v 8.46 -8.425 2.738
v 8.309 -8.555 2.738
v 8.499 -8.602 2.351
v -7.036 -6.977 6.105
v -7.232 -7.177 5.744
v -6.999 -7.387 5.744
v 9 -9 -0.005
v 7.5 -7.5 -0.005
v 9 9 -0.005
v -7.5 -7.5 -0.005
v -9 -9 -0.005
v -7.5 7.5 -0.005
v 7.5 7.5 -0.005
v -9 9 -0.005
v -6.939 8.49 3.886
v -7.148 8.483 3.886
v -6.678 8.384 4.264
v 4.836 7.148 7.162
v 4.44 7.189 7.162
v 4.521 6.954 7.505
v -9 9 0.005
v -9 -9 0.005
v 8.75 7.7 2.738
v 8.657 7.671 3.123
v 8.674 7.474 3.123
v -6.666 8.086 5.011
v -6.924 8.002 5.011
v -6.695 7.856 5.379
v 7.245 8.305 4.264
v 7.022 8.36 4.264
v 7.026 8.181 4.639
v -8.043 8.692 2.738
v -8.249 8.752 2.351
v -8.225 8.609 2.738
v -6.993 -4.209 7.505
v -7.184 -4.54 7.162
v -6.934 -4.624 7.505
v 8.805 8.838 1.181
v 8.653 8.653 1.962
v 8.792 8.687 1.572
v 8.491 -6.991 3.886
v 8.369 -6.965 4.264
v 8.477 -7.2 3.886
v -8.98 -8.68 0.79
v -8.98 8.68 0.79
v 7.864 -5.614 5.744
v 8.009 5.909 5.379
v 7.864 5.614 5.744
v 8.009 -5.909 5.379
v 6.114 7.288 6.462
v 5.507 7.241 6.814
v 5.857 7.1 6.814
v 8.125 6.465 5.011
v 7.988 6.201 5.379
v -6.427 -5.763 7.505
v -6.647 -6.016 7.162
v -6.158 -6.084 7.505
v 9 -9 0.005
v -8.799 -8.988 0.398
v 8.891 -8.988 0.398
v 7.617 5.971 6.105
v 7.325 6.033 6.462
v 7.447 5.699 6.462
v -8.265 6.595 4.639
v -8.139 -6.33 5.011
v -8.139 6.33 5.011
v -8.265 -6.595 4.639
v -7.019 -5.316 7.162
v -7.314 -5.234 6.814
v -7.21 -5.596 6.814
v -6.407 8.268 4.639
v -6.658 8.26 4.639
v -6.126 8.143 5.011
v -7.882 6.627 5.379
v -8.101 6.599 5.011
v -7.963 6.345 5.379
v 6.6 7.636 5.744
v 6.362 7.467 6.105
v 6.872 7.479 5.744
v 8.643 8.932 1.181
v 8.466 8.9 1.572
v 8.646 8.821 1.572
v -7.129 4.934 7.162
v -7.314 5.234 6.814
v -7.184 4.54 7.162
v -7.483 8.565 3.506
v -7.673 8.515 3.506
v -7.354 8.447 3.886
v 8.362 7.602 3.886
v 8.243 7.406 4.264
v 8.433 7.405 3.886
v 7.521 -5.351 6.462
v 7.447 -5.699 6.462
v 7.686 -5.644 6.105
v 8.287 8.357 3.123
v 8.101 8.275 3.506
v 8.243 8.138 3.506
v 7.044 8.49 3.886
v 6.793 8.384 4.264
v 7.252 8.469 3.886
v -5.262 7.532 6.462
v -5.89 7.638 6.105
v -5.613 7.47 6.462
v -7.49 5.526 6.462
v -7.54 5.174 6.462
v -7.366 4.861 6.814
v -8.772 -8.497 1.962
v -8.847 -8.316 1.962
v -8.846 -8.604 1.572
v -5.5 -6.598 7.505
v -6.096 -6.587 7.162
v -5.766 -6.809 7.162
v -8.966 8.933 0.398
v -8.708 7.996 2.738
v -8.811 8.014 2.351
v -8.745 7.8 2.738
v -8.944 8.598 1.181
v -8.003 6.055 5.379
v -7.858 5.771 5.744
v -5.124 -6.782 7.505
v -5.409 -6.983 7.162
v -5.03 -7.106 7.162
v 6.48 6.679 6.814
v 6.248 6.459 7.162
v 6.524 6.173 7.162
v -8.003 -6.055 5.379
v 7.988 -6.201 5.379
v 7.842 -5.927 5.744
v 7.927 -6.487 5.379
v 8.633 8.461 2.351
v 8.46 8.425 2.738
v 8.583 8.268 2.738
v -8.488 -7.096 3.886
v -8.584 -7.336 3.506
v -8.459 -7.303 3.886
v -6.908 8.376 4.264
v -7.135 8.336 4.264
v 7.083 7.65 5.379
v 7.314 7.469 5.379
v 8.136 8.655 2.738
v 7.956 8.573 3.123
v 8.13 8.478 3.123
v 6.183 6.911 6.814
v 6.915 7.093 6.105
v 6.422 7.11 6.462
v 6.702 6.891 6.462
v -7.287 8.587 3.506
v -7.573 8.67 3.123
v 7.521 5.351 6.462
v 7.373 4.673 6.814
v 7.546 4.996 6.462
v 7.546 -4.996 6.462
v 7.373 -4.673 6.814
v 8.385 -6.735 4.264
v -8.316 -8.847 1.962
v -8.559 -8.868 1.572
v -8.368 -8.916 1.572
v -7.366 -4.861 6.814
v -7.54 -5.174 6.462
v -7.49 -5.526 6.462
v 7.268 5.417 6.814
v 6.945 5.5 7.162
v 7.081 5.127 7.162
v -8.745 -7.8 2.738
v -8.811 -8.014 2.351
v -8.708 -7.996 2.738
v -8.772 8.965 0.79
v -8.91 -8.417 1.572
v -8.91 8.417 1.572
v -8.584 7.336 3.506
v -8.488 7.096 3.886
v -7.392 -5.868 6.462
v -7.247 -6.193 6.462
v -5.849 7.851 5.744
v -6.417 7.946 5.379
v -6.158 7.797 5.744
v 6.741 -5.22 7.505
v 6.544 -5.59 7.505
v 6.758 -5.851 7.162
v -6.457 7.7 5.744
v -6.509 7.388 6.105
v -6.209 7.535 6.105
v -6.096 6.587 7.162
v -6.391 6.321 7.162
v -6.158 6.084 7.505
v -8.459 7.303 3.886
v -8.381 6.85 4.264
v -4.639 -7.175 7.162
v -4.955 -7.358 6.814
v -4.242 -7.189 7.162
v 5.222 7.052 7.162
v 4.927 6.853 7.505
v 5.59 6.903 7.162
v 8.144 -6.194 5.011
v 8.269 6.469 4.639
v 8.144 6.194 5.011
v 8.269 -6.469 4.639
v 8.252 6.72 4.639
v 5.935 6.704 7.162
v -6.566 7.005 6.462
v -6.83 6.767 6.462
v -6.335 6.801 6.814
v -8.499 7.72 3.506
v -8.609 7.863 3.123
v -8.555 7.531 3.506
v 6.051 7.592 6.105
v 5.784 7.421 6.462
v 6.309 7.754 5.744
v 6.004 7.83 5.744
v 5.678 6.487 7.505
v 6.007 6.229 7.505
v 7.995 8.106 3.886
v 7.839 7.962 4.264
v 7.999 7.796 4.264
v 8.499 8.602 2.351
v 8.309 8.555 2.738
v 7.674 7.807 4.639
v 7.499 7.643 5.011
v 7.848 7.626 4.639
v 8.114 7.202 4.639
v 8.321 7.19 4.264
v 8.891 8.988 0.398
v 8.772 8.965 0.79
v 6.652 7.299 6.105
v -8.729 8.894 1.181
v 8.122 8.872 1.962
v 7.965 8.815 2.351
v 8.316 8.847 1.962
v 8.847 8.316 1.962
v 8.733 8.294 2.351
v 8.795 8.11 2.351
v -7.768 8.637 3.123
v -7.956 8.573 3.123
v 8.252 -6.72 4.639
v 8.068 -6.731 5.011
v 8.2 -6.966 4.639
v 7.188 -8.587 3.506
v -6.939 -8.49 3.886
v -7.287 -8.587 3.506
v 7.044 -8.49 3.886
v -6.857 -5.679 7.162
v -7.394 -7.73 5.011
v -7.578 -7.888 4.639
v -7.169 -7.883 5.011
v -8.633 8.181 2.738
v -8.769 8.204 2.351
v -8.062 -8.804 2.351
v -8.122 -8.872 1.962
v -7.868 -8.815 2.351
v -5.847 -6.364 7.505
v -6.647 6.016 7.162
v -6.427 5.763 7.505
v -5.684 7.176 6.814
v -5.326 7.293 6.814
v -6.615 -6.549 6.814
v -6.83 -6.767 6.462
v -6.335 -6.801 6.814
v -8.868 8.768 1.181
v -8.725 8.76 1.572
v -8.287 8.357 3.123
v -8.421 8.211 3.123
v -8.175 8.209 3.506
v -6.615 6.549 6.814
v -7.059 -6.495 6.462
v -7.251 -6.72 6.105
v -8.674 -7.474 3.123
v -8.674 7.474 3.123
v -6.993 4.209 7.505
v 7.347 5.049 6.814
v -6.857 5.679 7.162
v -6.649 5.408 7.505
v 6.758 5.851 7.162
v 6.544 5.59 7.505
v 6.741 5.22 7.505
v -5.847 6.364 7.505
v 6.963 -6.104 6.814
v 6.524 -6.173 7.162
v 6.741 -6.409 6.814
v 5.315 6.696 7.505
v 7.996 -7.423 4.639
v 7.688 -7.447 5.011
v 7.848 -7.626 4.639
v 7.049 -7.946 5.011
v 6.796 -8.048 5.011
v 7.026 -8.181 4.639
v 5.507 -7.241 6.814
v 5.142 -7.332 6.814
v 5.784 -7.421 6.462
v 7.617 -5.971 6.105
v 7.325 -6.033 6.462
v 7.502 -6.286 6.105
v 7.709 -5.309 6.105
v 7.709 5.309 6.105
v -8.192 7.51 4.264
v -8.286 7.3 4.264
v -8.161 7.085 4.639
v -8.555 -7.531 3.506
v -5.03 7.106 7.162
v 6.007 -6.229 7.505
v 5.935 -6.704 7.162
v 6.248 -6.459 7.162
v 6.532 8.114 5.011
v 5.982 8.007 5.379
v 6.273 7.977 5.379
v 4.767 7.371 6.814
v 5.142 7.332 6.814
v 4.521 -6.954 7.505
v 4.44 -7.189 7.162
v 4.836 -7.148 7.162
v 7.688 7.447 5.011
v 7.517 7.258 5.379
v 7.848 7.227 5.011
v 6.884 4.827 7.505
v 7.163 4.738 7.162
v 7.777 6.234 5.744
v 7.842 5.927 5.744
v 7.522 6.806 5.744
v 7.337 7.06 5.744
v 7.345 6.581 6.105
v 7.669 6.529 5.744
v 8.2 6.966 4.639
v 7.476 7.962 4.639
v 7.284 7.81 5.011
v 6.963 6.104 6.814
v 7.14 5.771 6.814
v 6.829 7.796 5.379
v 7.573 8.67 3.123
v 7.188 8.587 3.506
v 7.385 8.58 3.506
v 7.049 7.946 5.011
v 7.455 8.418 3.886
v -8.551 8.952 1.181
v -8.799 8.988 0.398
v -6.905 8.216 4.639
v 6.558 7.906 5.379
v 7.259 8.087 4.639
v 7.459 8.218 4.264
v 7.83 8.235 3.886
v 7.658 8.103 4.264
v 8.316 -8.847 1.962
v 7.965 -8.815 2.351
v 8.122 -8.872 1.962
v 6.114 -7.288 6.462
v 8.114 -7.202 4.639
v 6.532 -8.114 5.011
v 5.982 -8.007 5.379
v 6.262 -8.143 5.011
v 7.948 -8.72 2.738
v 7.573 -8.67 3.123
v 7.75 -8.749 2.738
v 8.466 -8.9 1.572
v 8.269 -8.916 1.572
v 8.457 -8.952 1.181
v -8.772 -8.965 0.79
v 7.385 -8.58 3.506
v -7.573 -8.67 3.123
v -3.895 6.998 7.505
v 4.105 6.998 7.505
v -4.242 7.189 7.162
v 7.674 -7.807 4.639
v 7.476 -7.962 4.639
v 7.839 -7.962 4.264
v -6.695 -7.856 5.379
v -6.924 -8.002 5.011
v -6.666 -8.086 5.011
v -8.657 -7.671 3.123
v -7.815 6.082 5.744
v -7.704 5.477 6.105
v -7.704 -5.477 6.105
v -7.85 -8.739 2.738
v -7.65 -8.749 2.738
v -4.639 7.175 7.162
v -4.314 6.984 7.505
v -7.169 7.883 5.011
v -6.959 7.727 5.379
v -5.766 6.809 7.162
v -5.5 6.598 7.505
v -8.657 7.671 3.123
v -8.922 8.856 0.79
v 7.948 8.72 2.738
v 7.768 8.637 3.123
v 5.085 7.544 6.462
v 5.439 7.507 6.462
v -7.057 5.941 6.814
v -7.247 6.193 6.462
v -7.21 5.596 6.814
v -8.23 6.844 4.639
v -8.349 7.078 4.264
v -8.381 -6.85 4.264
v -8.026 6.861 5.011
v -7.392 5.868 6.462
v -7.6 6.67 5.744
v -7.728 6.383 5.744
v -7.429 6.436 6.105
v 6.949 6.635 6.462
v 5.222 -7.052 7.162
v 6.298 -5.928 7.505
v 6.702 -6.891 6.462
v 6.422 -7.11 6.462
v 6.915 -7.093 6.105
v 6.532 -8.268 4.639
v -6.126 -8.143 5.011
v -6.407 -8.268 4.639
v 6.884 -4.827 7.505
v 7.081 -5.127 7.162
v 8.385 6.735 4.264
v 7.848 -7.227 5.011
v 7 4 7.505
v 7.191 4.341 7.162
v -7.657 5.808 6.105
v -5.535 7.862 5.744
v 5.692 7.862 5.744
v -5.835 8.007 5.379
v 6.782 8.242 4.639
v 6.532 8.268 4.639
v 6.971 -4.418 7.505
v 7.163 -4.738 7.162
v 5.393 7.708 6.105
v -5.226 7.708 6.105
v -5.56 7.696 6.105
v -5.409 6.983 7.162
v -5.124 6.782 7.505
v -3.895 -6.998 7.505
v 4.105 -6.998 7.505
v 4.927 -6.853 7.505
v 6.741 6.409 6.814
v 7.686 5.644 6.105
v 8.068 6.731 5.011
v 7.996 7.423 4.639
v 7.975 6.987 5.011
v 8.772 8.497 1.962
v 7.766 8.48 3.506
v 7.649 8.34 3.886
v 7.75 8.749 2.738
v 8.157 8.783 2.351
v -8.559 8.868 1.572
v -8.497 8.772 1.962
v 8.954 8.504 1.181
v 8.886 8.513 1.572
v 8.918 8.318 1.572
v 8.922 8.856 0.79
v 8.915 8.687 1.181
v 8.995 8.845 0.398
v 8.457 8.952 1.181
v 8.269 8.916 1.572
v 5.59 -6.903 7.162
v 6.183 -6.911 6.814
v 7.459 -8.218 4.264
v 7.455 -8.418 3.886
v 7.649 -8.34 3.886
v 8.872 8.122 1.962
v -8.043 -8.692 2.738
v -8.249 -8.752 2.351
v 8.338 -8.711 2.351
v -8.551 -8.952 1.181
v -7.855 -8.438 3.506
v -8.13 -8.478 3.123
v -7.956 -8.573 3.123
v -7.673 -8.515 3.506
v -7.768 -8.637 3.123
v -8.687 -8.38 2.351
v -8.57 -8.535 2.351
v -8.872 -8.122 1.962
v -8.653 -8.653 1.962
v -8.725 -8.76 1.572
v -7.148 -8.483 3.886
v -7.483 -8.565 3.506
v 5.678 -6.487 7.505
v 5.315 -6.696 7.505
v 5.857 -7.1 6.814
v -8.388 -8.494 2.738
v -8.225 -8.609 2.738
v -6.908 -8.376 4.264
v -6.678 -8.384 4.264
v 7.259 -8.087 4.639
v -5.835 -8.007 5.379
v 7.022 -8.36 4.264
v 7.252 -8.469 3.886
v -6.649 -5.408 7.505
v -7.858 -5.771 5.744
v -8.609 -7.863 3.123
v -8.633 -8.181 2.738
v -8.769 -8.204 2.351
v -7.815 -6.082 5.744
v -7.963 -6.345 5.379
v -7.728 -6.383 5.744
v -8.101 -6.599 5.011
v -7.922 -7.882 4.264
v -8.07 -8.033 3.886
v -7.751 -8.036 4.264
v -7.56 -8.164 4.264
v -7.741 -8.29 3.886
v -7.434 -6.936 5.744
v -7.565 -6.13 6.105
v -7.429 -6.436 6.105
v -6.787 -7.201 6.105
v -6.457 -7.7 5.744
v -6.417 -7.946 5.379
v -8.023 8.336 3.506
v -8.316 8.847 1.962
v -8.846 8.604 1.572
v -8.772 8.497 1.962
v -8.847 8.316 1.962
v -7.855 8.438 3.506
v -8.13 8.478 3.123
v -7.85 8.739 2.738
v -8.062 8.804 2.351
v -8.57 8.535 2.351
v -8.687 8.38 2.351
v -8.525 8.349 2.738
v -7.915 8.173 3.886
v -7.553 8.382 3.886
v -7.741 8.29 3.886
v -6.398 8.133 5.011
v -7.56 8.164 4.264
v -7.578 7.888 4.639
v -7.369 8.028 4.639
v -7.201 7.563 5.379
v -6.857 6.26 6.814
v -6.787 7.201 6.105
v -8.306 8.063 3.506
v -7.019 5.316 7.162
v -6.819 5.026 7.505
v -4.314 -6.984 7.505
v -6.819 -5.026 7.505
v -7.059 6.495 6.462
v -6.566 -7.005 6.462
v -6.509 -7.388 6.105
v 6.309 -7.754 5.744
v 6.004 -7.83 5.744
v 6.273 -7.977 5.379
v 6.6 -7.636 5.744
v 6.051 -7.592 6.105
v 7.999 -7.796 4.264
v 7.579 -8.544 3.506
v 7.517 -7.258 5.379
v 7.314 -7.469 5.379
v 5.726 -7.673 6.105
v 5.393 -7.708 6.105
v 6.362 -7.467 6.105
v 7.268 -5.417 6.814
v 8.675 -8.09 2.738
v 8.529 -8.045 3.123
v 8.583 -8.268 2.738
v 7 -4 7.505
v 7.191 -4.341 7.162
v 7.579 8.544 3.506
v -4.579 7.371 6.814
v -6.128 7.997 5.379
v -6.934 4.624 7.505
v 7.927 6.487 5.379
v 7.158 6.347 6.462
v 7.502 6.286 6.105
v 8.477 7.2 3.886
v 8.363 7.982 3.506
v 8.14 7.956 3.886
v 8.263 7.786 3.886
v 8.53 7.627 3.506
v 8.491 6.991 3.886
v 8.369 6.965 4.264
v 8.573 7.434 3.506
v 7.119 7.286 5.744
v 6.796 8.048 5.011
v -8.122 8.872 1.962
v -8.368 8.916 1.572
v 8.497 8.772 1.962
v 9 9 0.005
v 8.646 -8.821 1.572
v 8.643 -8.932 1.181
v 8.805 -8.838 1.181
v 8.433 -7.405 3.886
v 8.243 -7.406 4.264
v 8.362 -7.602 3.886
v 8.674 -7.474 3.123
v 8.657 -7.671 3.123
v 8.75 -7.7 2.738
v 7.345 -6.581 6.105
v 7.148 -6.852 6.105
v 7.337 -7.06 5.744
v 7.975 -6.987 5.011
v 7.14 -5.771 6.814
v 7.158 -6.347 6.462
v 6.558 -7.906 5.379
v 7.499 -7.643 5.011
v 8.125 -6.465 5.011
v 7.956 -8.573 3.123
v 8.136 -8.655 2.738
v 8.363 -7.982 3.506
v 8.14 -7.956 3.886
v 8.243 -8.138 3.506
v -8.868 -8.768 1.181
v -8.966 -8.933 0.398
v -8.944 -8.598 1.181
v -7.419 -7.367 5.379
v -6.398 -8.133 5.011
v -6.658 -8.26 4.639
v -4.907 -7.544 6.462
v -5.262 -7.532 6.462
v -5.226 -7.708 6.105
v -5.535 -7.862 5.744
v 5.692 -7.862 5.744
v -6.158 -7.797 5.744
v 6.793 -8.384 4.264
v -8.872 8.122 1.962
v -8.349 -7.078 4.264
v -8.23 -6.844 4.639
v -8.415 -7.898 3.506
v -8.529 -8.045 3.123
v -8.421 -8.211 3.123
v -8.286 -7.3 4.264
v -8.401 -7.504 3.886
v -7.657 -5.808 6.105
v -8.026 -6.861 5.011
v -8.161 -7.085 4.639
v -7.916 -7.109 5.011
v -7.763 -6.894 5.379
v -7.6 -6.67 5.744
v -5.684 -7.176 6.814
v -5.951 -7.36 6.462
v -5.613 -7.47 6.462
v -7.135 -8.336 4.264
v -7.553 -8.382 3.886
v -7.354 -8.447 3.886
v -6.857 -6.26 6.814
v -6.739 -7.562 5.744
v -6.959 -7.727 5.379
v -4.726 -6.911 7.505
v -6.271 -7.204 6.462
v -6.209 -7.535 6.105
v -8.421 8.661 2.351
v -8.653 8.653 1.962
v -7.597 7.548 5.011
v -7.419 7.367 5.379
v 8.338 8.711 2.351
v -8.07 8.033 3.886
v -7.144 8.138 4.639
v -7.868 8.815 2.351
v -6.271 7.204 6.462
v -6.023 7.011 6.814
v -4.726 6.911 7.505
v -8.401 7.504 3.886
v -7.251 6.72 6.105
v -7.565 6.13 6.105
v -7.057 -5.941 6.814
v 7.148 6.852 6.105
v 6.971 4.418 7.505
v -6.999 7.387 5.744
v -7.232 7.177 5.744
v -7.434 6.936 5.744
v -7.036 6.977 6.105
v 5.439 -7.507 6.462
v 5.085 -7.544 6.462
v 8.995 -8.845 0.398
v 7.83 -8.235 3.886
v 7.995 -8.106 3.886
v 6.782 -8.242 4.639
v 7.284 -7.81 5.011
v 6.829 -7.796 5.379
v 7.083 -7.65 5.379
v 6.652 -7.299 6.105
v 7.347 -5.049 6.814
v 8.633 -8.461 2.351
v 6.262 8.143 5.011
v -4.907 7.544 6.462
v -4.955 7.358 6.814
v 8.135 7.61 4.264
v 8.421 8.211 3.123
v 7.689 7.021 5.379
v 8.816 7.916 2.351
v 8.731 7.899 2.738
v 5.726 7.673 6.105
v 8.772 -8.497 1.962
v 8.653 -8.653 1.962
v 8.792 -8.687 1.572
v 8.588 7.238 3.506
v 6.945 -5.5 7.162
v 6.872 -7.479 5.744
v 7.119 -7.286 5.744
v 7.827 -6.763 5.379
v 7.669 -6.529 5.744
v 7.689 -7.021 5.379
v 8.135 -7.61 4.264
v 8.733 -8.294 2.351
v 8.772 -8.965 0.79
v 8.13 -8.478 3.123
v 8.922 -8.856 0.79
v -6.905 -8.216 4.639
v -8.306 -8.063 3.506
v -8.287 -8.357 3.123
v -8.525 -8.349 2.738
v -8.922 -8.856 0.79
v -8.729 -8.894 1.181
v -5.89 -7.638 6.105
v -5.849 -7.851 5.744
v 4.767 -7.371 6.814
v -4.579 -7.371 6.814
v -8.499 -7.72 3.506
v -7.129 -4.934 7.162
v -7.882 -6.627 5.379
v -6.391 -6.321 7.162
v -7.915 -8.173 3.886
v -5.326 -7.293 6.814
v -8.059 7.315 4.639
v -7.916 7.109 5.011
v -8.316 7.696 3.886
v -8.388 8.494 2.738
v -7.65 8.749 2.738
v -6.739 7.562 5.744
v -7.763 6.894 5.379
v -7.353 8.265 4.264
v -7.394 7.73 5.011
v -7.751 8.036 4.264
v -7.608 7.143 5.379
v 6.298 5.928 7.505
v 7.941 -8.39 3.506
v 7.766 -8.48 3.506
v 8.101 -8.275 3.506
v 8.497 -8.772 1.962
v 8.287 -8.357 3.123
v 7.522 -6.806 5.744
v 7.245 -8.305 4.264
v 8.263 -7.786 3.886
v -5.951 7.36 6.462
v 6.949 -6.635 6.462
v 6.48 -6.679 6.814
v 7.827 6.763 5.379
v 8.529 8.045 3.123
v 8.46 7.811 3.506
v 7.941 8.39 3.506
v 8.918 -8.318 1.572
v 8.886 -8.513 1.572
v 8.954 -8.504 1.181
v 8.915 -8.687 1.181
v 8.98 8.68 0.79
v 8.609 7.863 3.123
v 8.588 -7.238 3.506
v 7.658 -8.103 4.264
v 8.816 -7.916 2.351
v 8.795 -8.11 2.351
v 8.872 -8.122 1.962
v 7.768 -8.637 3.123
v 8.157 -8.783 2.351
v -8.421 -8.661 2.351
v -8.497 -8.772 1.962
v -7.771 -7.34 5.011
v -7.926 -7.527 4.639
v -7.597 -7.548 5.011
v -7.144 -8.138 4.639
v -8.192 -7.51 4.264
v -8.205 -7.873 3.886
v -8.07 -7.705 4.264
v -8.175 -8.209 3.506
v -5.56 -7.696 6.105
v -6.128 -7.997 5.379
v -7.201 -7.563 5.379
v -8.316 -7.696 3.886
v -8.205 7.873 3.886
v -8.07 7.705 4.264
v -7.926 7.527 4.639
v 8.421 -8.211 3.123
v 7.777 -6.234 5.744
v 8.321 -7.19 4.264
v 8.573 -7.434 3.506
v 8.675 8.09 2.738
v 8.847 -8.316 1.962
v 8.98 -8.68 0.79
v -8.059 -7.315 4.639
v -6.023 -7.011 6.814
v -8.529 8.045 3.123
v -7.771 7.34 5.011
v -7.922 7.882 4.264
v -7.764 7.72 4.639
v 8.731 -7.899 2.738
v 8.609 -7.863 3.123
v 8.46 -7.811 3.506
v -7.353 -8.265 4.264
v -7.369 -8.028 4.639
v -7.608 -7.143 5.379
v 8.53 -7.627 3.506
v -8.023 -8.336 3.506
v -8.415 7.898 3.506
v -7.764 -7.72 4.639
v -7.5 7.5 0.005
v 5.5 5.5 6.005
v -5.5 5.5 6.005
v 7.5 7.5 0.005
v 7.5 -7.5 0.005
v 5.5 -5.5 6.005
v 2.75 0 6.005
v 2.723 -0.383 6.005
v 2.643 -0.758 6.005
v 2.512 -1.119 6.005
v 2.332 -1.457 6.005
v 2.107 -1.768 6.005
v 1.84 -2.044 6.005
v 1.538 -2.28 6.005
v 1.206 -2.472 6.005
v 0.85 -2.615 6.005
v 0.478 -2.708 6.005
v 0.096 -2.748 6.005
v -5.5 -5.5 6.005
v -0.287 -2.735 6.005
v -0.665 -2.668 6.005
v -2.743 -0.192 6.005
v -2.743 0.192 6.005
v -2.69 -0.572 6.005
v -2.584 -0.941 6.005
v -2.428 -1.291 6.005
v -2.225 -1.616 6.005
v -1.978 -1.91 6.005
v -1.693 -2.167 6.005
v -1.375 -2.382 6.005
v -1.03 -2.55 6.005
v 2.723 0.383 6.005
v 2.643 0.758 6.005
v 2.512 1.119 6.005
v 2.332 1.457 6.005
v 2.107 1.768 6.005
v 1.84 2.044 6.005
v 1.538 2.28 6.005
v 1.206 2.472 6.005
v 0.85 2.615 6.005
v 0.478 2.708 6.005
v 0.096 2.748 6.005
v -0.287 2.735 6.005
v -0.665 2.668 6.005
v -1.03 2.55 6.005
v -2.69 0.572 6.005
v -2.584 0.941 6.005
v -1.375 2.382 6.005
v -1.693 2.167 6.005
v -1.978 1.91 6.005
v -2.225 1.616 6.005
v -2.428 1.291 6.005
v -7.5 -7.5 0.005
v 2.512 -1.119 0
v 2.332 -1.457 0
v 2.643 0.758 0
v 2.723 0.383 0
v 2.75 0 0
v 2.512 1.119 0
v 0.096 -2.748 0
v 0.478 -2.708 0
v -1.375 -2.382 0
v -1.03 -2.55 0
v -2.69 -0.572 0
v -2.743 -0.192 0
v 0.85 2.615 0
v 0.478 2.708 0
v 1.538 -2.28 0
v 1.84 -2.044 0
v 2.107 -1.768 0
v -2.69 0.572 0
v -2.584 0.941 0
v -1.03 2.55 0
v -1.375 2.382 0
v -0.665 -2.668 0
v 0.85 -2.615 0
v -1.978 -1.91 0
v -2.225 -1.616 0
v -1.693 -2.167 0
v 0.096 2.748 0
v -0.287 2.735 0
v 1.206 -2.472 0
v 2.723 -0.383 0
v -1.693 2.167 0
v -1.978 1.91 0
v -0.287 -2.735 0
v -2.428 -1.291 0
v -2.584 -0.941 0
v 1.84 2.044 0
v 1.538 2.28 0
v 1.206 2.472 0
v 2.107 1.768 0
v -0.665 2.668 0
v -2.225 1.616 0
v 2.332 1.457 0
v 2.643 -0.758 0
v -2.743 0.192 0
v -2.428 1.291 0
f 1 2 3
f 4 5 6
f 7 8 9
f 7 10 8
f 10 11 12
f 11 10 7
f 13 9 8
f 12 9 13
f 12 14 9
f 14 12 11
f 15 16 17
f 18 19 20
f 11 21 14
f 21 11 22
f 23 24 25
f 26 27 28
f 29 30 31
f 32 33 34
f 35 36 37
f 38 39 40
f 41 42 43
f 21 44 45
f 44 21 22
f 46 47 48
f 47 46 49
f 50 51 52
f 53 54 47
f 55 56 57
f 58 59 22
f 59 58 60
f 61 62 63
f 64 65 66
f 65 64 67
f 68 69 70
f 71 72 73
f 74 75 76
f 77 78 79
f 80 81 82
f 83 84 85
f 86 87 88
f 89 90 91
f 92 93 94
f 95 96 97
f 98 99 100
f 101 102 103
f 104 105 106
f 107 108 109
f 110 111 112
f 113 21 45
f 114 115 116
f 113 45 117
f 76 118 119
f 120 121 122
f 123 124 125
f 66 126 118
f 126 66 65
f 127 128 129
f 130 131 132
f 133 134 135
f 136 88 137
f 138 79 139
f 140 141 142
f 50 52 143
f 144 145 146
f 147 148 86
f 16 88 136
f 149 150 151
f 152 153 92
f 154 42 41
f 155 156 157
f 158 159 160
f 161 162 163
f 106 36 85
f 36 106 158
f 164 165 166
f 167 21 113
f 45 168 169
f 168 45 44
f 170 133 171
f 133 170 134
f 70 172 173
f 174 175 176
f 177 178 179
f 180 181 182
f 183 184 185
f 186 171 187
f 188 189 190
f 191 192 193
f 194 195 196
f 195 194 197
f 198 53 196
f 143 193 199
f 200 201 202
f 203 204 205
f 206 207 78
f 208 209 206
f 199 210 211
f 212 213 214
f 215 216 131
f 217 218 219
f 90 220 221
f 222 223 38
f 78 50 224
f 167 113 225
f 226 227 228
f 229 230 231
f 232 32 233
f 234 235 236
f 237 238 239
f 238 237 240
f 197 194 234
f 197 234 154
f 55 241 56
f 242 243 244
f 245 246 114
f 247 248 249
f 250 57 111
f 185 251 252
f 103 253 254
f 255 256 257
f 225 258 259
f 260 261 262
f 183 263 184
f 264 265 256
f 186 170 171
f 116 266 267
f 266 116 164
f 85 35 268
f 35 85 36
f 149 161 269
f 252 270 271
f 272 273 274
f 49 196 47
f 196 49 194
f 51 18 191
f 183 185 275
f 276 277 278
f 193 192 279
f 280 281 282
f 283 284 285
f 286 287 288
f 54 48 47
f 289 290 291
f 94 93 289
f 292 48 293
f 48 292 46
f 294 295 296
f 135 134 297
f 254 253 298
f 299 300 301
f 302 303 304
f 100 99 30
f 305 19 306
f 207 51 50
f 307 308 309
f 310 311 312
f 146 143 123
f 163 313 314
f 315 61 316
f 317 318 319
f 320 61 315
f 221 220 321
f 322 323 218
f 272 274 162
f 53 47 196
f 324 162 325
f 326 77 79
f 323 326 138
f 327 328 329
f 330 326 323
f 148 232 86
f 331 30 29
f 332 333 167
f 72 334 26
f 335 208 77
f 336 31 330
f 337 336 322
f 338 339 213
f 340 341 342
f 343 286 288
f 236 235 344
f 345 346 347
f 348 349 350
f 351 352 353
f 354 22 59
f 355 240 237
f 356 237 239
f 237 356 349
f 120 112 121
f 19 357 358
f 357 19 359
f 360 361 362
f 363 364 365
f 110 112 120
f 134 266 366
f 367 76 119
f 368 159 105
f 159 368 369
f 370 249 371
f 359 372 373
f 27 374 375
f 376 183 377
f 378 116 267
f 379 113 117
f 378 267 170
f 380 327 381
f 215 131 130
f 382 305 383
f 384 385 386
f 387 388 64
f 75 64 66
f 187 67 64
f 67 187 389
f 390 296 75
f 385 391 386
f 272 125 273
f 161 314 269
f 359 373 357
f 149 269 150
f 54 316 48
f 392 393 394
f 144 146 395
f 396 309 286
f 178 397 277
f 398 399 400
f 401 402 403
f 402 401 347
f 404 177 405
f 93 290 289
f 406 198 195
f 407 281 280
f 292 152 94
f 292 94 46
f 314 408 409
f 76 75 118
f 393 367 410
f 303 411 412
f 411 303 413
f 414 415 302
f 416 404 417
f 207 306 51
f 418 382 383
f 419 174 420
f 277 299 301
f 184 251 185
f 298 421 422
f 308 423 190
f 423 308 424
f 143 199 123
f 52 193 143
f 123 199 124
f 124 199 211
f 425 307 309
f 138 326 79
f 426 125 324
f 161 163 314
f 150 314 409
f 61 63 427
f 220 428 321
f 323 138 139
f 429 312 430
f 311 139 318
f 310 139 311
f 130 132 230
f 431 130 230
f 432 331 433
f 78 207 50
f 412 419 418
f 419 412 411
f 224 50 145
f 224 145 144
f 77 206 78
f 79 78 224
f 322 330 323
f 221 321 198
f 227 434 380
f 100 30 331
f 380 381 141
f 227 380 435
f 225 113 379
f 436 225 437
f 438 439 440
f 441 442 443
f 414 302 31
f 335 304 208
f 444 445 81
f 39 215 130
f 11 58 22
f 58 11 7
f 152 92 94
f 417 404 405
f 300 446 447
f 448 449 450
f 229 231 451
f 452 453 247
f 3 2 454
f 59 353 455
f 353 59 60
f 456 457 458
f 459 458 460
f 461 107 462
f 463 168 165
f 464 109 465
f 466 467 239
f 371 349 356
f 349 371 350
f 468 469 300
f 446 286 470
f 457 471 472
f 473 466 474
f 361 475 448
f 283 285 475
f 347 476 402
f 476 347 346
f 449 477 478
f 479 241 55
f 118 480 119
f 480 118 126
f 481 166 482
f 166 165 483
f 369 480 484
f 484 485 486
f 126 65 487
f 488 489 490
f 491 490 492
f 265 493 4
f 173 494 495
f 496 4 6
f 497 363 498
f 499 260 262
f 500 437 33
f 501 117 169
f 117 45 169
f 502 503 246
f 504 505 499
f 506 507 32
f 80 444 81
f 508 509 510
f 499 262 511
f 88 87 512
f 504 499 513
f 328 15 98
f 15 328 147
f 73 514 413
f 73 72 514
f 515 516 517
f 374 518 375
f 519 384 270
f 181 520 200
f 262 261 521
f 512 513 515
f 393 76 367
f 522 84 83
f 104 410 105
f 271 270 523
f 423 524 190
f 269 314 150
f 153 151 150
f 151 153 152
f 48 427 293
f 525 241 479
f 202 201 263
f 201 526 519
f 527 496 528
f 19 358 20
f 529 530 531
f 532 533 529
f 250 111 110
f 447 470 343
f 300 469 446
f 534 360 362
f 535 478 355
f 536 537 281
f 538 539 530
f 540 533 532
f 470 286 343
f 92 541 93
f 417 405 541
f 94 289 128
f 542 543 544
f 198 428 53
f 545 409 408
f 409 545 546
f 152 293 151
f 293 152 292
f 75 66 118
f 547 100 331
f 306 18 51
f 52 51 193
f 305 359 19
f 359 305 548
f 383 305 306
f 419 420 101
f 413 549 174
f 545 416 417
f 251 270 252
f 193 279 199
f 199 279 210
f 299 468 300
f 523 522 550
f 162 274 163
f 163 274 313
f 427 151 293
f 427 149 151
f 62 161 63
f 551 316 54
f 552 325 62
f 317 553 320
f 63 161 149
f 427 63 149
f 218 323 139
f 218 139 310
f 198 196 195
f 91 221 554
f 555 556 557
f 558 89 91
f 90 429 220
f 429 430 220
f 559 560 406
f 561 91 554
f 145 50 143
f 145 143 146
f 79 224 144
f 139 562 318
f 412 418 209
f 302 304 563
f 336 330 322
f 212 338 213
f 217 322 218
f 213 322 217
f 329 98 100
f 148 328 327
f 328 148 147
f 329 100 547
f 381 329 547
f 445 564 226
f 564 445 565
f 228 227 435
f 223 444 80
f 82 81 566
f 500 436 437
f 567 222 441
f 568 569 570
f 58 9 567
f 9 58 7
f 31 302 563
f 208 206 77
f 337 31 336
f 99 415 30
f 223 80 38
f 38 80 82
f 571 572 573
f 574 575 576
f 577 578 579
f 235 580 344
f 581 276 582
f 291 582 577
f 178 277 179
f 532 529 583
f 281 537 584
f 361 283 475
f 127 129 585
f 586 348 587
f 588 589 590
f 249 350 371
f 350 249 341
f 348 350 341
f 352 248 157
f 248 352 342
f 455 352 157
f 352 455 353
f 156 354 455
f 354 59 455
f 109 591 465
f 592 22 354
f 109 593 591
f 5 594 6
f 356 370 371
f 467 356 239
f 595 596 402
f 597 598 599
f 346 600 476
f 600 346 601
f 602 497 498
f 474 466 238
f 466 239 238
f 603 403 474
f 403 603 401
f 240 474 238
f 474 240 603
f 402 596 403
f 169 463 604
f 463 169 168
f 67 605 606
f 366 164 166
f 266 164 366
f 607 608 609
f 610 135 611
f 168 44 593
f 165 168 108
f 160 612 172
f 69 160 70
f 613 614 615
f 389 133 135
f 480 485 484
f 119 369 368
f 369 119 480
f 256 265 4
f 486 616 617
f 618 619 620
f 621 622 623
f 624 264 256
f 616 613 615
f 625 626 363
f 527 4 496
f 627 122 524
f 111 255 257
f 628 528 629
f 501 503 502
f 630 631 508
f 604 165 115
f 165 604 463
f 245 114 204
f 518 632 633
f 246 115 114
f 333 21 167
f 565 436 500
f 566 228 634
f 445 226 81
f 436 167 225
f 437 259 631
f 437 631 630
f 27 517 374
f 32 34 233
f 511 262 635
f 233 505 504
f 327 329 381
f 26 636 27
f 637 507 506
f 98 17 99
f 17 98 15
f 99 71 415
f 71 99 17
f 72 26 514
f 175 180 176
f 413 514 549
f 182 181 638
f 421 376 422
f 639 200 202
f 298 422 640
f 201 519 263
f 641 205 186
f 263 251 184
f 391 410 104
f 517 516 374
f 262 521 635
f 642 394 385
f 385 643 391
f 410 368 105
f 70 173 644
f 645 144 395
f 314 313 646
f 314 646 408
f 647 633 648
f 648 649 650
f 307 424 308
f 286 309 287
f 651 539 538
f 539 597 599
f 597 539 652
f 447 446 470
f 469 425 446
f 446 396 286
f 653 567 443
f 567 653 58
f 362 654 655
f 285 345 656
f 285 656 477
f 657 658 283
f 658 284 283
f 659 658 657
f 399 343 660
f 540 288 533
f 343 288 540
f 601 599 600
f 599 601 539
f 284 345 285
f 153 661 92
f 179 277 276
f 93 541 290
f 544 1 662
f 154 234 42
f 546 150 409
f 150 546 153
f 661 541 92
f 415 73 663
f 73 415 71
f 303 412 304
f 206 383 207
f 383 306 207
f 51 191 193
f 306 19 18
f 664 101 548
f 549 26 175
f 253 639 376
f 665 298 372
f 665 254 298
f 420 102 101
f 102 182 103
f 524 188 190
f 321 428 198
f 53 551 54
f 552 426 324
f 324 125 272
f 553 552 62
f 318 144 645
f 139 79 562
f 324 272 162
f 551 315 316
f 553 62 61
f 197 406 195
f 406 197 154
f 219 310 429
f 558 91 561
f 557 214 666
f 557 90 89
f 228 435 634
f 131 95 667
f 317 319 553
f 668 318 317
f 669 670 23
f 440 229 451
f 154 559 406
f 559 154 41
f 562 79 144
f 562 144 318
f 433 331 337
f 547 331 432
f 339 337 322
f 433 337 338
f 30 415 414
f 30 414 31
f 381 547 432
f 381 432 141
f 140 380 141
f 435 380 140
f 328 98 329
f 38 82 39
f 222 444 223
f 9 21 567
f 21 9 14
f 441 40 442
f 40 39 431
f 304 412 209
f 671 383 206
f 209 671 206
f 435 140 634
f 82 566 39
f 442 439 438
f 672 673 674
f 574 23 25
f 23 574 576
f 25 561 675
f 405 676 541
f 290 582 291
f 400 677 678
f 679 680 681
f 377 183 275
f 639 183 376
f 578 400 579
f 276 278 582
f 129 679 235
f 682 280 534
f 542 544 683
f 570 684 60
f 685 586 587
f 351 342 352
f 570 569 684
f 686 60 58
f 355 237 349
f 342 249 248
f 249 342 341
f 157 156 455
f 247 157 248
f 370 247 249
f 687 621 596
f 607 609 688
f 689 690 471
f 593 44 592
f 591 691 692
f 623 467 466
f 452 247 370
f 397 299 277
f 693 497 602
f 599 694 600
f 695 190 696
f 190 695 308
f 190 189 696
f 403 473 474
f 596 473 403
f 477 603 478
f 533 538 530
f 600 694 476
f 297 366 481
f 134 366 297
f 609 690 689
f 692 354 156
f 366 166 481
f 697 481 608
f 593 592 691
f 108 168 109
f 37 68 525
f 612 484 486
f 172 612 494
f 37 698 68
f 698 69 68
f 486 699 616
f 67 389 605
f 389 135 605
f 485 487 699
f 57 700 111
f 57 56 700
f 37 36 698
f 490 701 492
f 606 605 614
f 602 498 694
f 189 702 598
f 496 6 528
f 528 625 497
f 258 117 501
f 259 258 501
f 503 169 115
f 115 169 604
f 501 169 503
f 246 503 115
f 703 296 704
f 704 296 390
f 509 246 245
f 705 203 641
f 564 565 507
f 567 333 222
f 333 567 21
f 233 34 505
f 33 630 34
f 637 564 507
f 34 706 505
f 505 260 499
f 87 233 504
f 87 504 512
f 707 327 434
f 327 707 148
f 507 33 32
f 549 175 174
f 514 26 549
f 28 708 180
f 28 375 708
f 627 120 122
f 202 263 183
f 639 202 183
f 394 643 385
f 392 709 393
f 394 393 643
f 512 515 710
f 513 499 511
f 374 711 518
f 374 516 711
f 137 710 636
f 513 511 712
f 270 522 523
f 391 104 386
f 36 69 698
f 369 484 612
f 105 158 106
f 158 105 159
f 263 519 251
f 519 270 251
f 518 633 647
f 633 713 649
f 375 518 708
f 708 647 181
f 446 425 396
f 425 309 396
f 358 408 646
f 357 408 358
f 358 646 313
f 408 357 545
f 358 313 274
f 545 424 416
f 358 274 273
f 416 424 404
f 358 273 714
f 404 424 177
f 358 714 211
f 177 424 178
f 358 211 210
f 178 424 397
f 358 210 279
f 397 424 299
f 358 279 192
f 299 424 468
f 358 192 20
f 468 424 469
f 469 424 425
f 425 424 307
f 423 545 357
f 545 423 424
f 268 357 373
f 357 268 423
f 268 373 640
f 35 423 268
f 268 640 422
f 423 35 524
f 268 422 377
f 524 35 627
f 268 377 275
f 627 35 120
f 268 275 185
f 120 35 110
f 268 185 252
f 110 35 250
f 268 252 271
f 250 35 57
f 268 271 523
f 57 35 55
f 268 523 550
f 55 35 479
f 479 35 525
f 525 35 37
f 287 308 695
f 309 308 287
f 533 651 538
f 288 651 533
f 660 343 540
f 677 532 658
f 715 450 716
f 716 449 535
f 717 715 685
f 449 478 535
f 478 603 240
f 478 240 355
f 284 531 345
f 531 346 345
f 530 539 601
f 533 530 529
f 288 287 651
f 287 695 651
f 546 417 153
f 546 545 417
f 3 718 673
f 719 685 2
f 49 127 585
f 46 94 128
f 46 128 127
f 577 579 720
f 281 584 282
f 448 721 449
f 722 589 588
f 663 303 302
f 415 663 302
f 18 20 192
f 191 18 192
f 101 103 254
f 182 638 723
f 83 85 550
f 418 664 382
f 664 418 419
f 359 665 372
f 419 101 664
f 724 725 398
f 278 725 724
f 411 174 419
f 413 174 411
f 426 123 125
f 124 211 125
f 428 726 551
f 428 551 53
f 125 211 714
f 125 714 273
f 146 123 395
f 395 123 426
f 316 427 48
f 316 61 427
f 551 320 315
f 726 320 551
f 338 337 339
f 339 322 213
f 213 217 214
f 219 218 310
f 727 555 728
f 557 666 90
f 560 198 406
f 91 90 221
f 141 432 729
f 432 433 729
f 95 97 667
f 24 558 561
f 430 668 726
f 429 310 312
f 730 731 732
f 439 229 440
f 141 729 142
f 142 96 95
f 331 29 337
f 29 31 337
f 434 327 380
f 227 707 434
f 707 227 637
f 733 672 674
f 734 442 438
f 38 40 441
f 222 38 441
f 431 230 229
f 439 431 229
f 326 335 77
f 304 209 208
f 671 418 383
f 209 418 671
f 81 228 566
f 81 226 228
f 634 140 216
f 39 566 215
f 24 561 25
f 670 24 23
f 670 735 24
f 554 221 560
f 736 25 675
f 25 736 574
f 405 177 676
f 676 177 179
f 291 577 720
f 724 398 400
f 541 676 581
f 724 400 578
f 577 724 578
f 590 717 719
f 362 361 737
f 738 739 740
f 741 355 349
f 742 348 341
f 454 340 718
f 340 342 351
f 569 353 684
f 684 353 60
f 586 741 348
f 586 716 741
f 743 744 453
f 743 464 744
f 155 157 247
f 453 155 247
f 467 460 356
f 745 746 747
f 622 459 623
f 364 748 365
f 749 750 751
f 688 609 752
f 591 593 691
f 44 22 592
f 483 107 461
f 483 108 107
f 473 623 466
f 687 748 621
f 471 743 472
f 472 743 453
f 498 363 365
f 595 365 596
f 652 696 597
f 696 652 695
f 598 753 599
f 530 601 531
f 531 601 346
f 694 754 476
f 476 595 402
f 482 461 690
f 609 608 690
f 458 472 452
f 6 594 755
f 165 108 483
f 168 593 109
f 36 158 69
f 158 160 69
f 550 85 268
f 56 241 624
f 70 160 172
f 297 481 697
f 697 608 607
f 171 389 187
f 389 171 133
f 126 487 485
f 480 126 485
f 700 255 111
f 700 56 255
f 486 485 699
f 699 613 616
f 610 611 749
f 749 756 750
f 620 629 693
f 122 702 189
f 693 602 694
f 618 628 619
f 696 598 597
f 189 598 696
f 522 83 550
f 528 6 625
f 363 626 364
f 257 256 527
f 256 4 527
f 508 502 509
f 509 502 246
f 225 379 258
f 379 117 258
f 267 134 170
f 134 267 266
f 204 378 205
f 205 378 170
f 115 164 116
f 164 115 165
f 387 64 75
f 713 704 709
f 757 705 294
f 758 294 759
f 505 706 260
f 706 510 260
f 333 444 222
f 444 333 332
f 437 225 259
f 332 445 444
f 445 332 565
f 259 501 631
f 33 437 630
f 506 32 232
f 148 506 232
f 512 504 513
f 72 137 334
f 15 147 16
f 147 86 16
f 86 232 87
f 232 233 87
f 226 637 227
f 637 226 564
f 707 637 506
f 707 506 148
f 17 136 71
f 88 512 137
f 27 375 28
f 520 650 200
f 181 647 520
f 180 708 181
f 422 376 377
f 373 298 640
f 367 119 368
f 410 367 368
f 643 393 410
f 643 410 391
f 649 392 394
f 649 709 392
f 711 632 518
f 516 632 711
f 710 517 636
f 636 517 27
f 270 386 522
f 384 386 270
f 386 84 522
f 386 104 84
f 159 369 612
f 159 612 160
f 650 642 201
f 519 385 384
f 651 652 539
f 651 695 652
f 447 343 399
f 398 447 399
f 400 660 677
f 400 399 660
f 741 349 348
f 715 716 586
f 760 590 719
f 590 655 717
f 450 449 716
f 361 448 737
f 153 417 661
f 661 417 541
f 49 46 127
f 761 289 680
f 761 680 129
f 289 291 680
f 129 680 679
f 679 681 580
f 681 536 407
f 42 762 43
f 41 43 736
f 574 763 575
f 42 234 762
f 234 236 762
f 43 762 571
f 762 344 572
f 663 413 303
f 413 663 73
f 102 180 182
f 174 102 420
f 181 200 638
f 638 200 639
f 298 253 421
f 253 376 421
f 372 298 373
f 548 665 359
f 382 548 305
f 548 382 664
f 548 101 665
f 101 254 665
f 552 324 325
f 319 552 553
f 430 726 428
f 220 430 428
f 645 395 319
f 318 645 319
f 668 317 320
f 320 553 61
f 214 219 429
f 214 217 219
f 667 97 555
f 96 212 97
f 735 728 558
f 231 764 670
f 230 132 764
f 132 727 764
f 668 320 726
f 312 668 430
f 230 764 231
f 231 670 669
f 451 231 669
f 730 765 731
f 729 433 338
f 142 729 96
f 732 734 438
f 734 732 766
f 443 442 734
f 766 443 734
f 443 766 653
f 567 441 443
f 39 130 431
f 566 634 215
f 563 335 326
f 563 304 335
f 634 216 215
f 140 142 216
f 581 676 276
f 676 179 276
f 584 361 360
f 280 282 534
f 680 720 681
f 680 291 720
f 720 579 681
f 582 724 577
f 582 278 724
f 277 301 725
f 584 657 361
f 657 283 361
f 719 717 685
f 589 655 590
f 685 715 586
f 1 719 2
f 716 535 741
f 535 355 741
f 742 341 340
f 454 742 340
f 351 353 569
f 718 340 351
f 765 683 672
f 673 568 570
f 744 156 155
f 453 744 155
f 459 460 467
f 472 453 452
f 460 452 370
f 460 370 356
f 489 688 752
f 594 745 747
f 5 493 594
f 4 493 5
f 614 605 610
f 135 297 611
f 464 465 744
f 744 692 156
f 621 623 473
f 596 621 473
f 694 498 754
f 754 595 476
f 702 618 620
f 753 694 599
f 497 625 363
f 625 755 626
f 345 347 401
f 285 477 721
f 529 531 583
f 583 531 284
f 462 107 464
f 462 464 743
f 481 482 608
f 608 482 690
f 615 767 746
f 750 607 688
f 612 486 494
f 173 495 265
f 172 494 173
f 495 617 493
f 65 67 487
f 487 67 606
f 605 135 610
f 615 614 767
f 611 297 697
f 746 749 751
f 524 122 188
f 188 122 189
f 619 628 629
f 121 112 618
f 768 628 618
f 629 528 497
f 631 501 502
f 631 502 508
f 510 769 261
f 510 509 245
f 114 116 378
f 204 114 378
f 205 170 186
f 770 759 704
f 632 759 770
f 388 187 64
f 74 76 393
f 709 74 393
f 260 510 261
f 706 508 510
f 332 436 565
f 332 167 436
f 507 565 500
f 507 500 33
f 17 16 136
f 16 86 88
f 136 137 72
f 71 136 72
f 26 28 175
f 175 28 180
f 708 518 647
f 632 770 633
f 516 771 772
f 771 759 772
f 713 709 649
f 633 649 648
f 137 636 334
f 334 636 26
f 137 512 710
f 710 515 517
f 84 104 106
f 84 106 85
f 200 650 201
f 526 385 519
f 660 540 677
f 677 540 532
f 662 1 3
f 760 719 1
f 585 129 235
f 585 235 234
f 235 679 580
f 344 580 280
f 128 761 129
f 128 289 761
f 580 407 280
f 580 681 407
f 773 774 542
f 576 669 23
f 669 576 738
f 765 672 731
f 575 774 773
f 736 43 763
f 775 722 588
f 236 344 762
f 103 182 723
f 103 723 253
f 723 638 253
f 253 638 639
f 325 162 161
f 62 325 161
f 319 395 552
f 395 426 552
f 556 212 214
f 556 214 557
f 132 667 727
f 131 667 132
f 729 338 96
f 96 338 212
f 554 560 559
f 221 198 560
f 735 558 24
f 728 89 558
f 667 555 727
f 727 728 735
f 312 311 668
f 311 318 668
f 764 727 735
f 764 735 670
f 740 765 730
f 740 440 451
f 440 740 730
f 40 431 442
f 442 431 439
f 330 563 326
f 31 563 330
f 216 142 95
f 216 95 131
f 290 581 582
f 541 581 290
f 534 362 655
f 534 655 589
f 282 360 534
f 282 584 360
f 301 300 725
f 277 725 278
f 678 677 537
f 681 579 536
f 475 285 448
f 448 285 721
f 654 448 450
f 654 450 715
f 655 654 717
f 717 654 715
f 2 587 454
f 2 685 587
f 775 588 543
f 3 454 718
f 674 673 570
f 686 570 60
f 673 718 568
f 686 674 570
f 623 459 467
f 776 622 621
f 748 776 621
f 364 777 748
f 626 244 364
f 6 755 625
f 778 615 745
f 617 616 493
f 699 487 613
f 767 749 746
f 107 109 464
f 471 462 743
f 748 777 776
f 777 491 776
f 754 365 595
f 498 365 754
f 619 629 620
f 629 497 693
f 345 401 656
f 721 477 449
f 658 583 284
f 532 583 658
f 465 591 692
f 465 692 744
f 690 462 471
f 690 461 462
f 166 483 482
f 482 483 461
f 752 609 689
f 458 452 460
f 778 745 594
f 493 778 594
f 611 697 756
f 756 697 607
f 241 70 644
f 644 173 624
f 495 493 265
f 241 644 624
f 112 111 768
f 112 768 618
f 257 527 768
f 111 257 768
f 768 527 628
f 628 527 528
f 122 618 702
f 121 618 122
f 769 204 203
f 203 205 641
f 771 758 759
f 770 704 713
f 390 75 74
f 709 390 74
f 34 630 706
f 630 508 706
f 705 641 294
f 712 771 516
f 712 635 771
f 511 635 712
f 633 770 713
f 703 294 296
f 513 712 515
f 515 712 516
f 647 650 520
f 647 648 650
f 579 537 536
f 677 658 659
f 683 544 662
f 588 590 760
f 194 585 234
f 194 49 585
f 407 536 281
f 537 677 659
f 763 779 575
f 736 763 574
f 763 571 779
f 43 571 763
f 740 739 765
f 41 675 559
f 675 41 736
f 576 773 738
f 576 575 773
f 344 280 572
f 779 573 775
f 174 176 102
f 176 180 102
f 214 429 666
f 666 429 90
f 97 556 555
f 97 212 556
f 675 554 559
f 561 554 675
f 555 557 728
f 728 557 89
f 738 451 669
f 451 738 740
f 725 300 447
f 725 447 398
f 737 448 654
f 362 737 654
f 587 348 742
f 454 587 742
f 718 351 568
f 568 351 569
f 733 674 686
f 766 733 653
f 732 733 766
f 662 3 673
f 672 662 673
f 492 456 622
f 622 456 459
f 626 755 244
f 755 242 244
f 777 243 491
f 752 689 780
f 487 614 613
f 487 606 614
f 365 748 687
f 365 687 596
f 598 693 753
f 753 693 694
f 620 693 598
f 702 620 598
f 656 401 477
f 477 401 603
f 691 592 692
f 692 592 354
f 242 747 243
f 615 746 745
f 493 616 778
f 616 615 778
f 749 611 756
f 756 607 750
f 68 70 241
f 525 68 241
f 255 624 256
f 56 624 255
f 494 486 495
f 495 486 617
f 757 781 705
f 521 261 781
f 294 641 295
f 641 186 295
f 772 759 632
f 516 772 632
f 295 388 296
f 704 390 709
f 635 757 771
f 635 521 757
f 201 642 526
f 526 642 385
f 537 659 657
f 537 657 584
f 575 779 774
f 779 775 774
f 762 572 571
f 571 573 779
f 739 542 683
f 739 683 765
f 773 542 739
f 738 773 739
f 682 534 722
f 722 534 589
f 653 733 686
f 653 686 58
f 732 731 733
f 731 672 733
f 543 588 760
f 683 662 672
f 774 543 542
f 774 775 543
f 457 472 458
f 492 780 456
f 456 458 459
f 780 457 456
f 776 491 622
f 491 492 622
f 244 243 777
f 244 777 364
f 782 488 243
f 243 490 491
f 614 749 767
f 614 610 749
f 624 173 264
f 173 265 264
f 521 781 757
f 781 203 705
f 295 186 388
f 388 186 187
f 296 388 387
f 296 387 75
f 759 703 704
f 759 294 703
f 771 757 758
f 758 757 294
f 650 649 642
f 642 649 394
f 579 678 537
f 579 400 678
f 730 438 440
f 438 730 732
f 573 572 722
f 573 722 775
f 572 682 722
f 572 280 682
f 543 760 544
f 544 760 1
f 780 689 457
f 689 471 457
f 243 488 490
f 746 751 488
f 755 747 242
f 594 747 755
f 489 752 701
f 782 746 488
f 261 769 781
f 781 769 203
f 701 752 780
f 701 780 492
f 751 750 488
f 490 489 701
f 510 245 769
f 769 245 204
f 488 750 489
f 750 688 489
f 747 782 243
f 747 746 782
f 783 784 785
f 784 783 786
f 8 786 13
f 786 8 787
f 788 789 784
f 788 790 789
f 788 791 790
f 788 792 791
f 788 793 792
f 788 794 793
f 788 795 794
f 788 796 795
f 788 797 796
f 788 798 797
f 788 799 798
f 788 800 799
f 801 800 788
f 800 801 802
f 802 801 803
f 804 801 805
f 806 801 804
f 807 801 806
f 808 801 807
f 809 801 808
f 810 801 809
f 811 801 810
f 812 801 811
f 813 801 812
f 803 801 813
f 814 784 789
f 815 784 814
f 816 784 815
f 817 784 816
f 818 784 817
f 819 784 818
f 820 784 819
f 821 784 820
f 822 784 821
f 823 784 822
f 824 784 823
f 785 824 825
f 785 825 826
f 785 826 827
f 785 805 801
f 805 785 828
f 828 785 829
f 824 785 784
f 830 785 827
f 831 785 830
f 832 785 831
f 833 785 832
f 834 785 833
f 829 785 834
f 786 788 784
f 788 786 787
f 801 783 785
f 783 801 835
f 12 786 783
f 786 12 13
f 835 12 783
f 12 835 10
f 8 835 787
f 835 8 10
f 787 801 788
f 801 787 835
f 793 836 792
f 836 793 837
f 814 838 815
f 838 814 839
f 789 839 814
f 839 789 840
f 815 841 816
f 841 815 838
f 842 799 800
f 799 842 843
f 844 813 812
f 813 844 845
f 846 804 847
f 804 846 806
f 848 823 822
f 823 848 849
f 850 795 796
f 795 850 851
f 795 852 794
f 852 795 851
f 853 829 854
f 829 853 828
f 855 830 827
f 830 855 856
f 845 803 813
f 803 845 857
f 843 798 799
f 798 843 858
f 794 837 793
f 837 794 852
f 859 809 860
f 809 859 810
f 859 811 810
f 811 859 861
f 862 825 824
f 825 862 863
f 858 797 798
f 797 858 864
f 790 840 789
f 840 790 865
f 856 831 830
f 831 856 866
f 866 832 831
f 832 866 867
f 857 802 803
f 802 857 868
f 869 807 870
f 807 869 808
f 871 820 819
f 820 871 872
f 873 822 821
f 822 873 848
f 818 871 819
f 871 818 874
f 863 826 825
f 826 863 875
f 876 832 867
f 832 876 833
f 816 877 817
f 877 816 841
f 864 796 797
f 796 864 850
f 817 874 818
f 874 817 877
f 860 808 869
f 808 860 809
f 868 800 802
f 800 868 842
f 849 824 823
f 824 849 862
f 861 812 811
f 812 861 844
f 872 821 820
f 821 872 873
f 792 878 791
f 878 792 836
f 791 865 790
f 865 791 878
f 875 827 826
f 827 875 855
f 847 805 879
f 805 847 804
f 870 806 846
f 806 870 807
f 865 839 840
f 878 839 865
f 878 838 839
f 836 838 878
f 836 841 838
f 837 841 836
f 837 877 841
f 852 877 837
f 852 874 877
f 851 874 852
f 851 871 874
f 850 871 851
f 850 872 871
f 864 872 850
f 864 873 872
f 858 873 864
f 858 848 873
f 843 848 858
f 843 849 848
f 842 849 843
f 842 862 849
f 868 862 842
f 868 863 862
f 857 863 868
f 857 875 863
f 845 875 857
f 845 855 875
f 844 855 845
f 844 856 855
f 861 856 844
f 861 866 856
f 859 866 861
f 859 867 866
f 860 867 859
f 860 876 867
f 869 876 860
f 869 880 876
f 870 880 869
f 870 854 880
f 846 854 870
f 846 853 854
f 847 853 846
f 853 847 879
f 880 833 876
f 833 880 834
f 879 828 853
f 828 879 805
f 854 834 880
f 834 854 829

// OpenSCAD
// reference: https://bebebe.hatenablog.jp/entry/2019/06/04/232501

$fs = 0.2;
$fa = 8;

module rounded_cube(size, r) {
  h = 0.0001;
  minkowski() {
    cube([size[0] - r * 2, size[1] - r * 2, size[2] - h], center = true);
    cylinder(r = r, h = h);
  }
}

module keycap_round_base(key_bottom_size, key_top_size, key_top_height, round_r, unit = 1) {
  n = 20;

  b = key_bottom_size;
  t = key_top_size;
  h = key_top_height;
  extraX = (unit - 1) * 19.05;

  r = h * h / (b - t) + (b - t)  / 4;
  theta_max = asin(h / r);

  hull() {
    for (i = [0 : n]) {
      translate([0, 0, r * sin(theta_max * i / n) ]) {
        x = b - 2 * r * (1 - cos(theta_max * i / n));
        rounded_cube([x + extraX, x, 0.01], round_r * i / n);
      }
    }
  }
}

module keycap_inner_hole (bottom, top, height, r, unit) {
  extraX = (unit - 1) * 19.05;
  hull() {
    translate([0, 0, height - 1.5])
      rounded_cube([top - 3 + extraX, top - 3, 0.01], 0);
    rounded_cube([bottom - 3 + extraX, bottom - 3, 0.01], 0);
  }
}

module stem (r, height) {
  cylinder(height, r, r);
}

key_bottom_size = 18;
key_top_size = 14;
key_top_height = 7.5;
u = 1.0;

difference () {
  keycap_round_base(key_bottom_size, key_top_size, key_top_height, 3, u);
  keycap_inner_hole(key_bottom_size, key_top_size, key_top_height, 3, u);
}
stem(2.75, key_top_height);
